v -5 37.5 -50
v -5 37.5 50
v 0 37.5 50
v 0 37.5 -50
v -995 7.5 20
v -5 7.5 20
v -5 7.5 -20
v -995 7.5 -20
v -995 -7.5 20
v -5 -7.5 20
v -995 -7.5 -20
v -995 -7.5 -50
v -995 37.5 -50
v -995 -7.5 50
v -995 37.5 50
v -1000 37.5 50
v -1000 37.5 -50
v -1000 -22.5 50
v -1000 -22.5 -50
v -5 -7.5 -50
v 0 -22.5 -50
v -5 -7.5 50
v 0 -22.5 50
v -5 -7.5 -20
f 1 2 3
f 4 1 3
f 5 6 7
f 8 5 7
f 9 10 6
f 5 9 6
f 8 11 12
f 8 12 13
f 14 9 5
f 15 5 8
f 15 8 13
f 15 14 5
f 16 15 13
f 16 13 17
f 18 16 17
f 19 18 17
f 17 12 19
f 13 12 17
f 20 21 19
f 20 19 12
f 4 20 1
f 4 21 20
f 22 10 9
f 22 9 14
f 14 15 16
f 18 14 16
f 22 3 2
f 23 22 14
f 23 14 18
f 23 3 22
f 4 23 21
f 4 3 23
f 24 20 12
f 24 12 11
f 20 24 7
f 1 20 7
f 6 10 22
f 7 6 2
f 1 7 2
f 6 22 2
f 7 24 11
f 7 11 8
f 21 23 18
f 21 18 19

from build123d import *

# Parameters (mm, degrees)
SKETCH1_W           = 40
SKETCH1_H           = 15
BOSS_EXTRUDE1_DEPTH = 1000
SKETCH2_W           = 5
SKETCH2_H           = 60
BOSS_EXTRUDE2_DEPTH = 100


with BuildPart() as part:
    # Sketch1 → Boss-Extrude1 (new body)
    with BuildSketch(Plane(origin=(0, 0, 0), x_dir=(0, 0, -1), z_dir=(1, 0, 0))):
        Polygon((50, -7.5), (20, -7.5), (-20, -7.5), (-50, -7.5), (-50, -22.5), (50, -22.5), align=None)
        Rectangle(SKETCH1_W, SKETCH1_H)
    extrude(amount=-BOSS_EXTRUDE1_DEPTH)

    # Sketch2 → Boss-Extrude2 (add)
    with BuildSketch(Plane.XY.offset(50)):
        with Locations((-2.5, 7.5)):
            Rectangle(SKETCH2_W, SKETCH2_H)
    boss_extrude2 = extrude(amount=-BOSS_EXTRUDE2_DEPTH)

    # Mirror1: Boss-Extrude2 across plane
    add(boss_extrude2.mirror(Plane.ZY.offset(500)))


solid = part.part
